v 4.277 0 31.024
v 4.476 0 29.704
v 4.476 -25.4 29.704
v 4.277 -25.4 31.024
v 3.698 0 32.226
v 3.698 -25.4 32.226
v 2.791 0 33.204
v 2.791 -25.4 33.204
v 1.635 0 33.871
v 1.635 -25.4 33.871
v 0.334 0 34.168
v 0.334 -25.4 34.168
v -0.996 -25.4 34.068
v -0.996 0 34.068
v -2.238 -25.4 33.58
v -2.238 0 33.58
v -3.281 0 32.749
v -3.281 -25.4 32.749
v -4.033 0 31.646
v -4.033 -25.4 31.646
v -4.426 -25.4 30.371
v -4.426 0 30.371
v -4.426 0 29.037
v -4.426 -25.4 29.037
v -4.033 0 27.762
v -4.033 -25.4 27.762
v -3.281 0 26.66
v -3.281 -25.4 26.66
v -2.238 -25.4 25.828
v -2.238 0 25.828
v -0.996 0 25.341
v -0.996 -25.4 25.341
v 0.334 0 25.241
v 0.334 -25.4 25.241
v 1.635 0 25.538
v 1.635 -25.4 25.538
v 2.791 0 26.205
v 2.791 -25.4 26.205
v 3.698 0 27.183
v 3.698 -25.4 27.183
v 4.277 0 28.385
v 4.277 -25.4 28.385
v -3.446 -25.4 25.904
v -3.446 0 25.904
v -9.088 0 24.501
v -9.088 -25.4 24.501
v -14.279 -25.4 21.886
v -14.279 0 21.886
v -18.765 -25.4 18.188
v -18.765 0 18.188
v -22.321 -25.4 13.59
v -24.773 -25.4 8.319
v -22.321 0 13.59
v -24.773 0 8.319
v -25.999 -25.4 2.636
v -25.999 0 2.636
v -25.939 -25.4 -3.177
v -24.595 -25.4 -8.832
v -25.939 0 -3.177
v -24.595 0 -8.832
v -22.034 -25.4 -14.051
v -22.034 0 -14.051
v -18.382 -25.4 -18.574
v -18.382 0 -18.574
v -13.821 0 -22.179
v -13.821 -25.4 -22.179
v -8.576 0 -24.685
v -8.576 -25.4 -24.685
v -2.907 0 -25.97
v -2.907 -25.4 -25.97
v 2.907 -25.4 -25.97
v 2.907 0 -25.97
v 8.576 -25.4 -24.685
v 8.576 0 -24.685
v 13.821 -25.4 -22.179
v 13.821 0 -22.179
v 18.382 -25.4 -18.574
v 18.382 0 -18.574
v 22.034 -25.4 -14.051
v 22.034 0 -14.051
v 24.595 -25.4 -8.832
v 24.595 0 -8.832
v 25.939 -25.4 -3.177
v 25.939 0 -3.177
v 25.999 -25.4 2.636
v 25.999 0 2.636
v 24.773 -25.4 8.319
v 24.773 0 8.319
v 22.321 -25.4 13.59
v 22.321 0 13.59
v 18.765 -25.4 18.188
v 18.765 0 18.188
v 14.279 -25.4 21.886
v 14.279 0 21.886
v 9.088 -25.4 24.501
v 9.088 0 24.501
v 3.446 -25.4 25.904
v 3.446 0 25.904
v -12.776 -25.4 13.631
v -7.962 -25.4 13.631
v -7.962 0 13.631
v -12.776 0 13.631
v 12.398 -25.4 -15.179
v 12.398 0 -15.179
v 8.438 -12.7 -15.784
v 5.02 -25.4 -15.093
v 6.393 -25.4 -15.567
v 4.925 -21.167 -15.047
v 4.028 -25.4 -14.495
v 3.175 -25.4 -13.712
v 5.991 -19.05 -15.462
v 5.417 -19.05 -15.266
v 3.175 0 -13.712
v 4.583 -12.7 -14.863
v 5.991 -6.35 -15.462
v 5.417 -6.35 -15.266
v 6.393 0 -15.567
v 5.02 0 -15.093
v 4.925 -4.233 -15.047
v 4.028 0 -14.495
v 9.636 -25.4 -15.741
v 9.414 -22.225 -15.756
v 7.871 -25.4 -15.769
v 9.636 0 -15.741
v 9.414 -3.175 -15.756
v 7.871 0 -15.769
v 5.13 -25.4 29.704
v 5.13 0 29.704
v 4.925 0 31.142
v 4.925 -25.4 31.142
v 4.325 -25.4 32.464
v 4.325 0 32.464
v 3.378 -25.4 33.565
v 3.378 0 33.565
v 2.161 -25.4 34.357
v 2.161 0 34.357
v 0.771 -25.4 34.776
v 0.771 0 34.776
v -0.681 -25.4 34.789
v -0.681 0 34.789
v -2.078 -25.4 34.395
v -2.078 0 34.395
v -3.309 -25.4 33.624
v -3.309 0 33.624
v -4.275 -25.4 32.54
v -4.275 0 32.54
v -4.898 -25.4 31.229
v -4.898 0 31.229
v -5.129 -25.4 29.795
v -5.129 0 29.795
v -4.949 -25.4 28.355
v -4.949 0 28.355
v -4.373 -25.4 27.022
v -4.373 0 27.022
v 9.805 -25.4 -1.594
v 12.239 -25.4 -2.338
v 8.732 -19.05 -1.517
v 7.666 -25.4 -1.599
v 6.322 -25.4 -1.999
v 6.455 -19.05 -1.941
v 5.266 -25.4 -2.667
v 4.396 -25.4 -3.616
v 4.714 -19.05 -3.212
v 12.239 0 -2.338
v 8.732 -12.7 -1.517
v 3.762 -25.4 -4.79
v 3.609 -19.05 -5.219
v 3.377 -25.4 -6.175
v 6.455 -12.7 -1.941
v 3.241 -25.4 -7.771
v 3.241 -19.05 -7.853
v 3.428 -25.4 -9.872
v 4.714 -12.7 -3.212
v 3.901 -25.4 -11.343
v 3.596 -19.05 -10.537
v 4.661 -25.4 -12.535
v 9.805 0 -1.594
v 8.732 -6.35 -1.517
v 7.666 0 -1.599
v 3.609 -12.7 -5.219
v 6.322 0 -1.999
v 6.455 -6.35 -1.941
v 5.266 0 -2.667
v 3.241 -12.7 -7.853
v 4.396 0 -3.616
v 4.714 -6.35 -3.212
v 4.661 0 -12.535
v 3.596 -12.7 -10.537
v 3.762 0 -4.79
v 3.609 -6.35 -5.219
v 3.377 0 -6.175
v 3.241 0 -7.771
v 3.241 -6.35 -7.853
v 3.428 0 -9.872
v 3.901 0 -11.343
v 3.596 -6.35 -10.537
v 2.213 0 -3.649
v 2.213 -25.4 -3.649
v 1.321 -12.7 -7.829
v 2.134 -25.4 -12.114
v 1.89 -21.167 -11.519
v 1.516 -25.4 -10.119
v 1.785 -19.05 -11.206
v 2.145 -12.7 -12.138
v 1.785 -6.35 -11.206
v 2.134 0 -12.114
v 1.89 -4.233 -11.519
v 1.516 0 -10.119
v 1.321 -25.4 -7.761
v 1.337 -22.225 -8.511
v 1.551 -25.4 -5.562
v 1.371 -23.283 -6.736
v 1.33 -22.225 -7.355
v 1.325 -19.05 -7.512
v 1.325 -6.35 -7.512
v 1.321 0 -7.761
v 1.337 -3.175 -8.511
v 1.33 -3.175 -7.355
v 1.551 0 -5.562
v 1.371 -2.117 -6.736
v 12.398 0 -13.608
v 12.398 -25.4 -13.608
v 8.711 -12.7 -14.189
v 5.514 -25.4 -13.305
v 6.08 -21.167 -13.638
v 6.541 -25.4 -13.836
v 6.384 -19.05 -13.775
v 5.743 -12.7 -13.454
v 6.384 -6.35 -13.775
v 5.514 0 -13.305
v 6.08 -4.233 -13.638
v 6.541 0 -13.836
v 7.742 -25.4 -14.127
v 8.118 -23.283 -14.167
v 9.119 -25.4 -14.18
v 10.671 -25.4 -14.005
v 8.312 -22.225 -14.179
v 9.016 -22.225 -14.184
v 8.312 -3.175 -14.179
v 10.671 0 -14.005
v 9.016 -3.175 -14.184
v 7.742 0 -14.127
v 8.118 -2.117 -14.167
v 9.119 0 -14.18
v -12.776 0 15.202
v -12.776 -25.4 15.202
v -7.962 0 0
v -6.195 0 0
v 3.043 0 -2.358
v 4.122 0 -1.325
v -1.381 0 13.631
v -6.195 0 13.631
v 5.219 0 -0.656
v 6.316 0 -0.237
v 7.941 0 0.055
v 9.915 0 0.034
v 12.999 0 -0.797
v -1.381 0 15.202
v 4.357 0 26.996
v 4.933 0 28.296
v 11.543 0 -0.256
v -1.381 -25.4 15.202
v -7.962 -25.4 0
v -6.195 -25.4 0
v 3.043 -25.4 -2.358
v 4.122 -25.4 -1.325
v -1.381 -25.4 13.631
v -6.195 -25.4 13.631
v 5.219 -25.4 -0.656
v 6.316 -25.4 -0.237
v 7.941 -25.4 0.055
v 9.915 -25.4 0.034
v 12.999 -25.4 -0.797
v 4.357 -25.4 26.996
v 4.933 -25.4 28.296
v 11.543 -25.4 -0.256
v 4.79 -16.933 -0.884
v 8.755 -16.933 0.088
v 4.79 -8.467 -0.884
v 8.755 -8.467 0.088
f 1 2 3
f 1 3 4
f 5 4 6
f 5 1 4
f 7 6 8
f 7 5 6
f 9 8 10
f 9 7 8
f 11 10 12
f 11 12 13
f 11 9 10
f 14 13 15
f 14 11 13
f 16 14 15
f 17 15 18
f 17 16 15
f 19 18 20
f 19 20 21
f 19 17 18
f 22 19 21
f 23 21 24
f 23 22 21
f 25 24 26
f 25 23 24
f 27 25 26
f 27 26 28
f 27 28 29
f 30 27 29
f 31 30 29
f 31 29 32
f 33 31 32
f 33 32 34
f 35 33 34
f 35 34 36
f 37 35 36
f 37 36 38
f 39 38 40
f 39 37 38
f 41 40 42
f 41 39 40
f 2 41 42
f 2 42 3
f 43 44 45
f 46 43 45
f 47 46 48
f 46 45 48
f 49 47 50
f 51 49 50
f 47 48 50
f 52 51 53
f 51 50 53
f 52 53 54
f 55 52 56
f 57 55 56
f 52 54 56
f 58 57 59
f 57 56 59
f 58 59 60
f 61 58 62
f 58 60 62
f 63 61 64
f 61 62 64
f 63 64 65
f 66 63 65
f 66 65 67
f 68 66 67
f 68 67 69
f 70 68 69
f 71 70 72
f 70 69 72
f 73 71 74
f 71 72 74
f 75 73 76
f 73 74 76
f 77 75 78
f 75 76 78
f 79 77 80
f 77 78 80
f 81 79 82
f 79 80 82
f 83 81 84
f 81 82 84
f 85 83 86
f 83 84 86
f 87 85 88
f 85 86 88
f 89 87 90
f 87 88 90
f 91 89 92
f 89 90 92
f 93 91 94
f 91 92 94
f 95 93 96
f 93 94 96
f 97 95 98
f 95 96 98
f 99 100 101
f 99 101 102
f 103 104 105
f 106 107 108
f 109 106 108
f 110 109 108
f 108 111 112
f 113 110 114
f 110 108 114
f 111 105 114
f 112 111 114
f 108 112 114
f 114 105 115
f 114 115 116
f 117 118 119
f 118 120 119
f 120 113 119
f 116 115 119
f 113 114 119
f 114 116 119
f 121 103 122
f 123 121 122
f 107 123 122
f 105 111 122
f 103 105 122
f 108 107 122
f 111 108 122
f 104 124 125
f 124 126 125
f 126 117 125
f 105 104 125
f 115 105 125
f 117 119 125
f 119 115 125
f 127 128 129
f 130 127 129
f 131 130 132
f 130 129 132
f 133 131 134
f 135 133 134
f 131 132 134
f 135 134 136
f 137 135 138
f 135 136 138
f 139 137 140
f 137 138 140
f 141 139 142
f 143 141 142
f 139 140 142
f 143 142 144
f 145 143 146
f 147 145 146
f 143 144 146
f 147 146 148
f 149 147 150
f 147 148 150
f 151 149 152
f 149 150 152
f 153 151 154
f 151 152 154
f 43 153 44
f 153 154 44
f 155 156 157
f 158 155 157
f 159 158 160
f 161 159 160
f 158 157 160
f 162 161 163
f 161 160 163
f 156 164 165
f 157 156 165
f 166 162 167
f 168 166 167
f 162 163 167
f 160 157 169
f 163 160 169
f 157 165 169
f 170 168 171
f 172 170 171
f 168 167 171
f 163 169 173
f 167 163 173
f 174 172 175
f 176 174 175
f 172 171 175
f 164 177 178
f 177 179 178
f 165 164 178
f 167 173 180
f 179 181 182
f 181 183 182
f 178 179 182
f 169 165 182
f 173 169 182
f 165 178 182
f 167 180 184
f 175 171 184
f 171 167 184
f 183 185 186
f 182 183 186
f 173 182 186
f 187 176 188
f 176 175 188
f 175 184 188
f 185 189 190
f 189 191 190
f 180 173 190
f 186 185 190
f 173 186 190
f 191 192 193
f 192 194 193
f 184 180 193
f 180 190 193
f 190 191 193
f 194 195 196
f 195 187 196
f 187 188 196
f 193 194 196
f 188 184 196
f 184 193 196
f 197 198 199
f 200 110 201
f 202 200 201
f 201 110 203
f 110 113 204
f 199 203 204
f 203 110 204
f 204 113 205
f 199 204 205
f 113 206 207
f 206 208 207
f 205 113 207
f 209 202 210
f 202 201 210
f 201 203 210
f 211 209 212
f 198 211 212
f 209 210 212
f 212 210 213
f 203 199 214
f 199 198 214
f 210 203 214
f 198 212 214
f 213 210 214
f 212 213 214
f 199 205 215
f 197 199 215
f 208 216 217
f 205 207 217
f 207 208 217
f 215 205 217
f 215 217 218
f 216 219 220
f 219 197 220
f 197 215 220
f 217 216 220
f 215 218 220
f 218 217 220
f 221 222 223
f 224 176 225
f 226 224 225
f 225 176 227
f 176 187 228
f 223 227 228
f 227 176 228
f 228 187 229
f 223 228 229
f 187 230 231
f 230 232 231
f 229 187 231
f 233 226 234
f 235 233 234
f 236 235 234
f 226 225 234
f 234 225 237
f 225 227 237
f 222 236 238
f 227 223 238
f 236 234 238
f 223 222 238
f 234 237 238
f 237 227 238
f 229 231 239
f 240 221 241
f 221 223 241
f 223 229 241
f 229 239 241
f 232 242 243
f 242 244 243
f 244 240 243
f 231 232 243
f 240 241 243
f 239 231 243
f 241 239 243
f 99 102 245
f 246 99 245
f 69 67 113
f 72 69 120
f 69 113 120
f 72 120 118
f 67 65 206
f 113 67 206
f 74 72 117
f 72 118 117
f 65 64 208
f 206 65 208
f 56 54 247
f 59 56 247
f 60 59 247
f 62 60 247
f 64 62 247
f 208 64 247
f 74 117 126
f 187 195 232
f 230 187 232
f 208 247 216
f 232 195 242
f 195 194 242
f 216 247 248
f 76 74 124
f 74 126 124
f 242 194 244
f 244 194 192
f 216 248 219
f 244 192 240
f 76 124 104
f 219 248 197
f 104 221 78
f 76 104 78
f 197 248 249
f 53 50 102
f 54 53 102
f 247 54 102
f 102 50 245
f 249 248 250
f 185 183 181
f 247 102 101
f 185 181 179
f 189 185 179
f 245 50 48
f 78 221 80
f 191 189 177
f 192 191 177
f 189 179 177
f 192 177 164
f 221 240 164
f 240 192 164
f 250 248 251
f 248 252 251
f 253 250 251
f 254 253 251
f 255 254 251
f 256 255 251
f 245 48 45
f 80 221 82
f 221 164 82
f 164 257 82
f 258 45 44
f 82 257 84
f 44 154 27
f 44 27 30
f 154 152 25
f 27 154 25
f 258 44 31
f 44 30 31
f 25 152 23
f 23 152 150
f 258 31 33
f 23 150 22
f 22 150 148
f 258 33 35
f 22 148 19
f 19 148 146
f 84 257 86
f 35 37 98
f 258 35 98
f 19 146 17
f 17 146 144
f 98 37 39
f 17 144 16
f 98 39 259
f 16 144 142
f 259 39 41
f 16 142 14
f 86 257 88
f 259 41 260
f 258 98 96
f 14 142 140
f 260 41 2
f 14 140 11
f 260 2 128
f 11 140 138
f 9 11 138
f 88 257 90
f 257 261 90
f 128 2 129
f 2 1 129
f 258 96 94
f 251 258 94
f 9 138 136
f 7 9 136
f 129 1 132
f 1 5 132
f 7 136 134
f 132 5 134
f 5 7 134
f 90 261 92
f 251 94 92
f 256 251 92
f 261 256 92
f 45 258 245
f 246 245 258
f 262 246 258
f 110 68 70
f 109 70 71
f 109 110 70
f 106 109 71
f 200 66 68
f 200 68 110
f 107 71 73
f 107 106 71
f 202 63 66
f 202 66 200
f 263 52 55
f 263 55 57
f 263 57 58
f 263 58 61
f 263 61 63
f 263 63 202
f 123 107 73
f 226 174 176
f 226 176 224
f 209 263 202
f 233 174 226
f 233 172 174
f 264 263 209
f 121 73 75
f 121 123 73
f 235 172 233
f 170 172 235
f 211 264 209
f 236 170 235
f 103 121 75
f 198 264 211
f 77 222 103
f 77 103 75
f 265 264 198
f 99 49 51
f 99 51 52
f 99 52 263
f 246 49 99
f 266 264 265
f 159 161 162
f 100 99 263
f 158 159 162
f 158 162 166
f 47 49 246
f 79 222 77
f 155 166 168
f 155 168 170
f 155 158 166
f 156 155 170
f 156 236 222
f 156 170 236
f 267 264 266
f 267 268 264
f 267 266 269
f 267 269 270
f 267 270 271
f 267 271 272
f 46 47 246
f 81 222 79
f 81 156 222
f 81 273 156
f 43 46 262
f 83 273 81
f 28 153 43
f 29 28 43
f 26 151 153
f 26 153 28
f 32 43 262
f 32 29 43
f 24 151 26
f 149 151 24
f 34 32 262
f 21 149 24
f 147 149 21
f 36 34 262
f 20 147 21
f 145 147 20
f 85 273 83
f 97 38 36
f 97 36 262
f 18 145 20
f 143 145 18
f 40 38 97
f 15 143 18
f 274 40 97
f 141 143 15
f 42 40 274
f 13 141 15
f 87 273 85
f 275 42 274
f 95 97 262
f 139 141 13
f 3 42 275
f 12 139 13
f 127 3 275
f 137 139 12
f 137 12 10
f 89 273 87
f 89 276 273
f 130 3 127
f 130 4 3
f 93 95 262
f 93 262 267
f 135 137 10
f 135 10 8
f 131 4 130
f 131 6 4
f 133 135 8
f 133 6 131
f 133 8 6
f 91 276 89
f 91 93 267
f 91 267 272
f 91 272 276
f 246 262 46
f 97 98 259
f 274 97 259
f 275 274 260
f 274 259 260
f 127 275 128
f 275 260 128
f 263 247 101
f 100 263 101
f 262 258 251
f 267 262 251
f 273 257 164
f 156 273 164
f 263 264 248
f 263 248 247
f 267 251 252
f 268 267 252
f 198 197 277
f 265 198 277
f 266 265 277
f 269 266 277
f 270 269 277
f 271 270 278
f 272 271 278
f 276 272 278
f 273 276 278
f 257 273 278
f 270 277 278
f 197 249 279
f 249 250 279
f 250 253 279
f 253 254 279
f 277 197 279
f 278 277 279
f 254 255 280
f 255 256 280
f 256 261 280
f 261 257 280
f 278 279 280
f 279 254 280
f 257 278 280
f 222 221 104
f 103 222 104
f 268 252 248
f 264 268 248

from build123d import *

# Parameters (mm, degrees)
F0_R     = 4.4758284469
F1_DEPTH = 25.4


with BuildPart() as f1:
    # F0 (on Front) → F1 (new body)
    with BuildSketch(Plane.XZ):
        with BuildLine():
            ThreePointArc((3.4462378282, 25.9042840516), (0, 24.5743248711), (-3.4462378282, 25.9042840516))
            ThreePointArc((-3.4462378282, 25.9042840516), (0, -26.1325178159), (3.4462378282, 25.9042840516))
        make_face()
        with BuildLine():
            add(Edge.make_bspline(
                [(12.2390337039, -2.3383244956), (10.4852903322, -1.5172076568), (8.7315469605, -1.5172076568)],
                knots=[0, 0, 0, 1, 1, 1], degree=2))
            add(Edge.make_bspline(
                [(8.7315469605, -1.5172076568), (6.1870984848, -1.5172076568), (4.7138188893, -3.2118170998)],
                knots=[0, 0, 0, 1, 1, 1], degree=2))
            add(Edge.make_bspline(
                [(4.7138188893, -3.2118170998), (3.2405392938, -4.9064265428), (3.2405392938, -7.8529857338)],
                knots=[0, 0, 0, 1, 1, 1], degree=2))
            add(Edge.make_bspline(
                [(3.2405392938, -7.8529857338), (3.2405392938, -10.8806428842), (4.6614431238, -12.5347033475)],
                knots=[0, 0, 0, 1, 1, 1], degree=2))
            add(Edge.make_bspline(
                [(4.6614431238, -12.5347033475), (6.0823469539, -14.1887638108), (8.7112724707, -14.1887638108)],
                knots=[0, 0, 0, 1, 1, 1], degree=2))
            add(Edge.make_bspline(
                [(8.7112724707, -14.1887638108), (10.3264734951, -14.1887638108), (12.3978505411, -13.6075617686)],
                knots=[0, 0, 0, 1, 1, 1], degree=2))
            Line((12.3978505411, -13.6075617686), (12.3978505411, -15.1788347317))
            add(Edge.make_bspline(
                [(12.3978505411, -15.1788347317), (10.7927867616, -15.7836903454), (8.4375668577, -15.7836903454)],
                knots=[0, 0, 0, 1, 1, 1], degree=2))
            add(Edge.make_bspline(
                [(8.4375668577, -15.7836903454), (5.0280734819, -15.7836903454), (3.1746472018, -13.7123132994)],
                knots=[0, 0, 0, 1, 1, 1], degree=2))
            add(Edge.make_bspline(
                [(3.1746472018, -13.7123132994), (1.3212209217, -11.6409362535), (1.3212209217, -7.8293321623)],
                knots=[0, 0, 0, 1, 1, 1], degree=2))
            add(Edge.make_bspline(
                [(1.3212209217, -7.8293321623), (1.3212209217, -5.4437005238), (2.2132984749, -3.6494081724)],
                knots=[0, 0, 0, 1, 1, 1], degree=2))
            add(Edge.make_bspline(
                [(2.2132984749, -3.6494081724), (3.1053760281, -1.8551158209), (4.7898482262, -0.8836298491)],
                knots=[0, 0, 0, 1, 1, 1], degree=2))
            add(Edge.make_bspline(
                [(4.7898482262, -0.8836298491), (6.4743204243, 0.0878561227), (8.755200532, 0.0878561227)],
                knots=[0, 0, 0, 1, 1, 1], degree=2))
            add(Edge.make_bspline(
                [(8.755200532, 0.0878561227), (11.1813811503, 0.0878561227), (12.9993270732, -0.7974632673)],
                knots=[0, 0, 0, 1, 1, 1], degree=2))
            Line((12.9993270732, -0.7974632673), (12.2390337039, -2.3383244956))
        make_face(mode=Mode.SUBTRACT)
        Polygon((-6.19505263, 13.6311120435), (-6.19505263, 0), (-7.9617405712, 0), (-7.9617405712, 13.6311120435), (-12.7760483883, 13.6311120435), (-12.7760483883, 15.2015013246), (-1.3807448128, 15.2015013246), (-1.3807448128, 13.6311120435), align=None, mode=Mode.SUBTRACT)
        with BuildLine():
            ThreePointArc((5.1299869915, 29.7043118626), (-2.0781736338, 34.3945102465), (-3.4462378282, 25.9042840516))
            ThreePointArc((-3.4462378282, 25.9042840516), (0, 24.5743248711), (3.4462378282, 25.9042840516))
            ThreePointArc((3.4462378282, 25.9042840516), (4.6901983839, 27.6261382288), (5.1299869915, 29.7043118626))
        make_face()
        with Locations((0, 29.7043118626)):
            Circle(F0_R, mode=Mode.SUBTRACT)
    extrude(amount=F1_DEPTH)


solid = f1.part
